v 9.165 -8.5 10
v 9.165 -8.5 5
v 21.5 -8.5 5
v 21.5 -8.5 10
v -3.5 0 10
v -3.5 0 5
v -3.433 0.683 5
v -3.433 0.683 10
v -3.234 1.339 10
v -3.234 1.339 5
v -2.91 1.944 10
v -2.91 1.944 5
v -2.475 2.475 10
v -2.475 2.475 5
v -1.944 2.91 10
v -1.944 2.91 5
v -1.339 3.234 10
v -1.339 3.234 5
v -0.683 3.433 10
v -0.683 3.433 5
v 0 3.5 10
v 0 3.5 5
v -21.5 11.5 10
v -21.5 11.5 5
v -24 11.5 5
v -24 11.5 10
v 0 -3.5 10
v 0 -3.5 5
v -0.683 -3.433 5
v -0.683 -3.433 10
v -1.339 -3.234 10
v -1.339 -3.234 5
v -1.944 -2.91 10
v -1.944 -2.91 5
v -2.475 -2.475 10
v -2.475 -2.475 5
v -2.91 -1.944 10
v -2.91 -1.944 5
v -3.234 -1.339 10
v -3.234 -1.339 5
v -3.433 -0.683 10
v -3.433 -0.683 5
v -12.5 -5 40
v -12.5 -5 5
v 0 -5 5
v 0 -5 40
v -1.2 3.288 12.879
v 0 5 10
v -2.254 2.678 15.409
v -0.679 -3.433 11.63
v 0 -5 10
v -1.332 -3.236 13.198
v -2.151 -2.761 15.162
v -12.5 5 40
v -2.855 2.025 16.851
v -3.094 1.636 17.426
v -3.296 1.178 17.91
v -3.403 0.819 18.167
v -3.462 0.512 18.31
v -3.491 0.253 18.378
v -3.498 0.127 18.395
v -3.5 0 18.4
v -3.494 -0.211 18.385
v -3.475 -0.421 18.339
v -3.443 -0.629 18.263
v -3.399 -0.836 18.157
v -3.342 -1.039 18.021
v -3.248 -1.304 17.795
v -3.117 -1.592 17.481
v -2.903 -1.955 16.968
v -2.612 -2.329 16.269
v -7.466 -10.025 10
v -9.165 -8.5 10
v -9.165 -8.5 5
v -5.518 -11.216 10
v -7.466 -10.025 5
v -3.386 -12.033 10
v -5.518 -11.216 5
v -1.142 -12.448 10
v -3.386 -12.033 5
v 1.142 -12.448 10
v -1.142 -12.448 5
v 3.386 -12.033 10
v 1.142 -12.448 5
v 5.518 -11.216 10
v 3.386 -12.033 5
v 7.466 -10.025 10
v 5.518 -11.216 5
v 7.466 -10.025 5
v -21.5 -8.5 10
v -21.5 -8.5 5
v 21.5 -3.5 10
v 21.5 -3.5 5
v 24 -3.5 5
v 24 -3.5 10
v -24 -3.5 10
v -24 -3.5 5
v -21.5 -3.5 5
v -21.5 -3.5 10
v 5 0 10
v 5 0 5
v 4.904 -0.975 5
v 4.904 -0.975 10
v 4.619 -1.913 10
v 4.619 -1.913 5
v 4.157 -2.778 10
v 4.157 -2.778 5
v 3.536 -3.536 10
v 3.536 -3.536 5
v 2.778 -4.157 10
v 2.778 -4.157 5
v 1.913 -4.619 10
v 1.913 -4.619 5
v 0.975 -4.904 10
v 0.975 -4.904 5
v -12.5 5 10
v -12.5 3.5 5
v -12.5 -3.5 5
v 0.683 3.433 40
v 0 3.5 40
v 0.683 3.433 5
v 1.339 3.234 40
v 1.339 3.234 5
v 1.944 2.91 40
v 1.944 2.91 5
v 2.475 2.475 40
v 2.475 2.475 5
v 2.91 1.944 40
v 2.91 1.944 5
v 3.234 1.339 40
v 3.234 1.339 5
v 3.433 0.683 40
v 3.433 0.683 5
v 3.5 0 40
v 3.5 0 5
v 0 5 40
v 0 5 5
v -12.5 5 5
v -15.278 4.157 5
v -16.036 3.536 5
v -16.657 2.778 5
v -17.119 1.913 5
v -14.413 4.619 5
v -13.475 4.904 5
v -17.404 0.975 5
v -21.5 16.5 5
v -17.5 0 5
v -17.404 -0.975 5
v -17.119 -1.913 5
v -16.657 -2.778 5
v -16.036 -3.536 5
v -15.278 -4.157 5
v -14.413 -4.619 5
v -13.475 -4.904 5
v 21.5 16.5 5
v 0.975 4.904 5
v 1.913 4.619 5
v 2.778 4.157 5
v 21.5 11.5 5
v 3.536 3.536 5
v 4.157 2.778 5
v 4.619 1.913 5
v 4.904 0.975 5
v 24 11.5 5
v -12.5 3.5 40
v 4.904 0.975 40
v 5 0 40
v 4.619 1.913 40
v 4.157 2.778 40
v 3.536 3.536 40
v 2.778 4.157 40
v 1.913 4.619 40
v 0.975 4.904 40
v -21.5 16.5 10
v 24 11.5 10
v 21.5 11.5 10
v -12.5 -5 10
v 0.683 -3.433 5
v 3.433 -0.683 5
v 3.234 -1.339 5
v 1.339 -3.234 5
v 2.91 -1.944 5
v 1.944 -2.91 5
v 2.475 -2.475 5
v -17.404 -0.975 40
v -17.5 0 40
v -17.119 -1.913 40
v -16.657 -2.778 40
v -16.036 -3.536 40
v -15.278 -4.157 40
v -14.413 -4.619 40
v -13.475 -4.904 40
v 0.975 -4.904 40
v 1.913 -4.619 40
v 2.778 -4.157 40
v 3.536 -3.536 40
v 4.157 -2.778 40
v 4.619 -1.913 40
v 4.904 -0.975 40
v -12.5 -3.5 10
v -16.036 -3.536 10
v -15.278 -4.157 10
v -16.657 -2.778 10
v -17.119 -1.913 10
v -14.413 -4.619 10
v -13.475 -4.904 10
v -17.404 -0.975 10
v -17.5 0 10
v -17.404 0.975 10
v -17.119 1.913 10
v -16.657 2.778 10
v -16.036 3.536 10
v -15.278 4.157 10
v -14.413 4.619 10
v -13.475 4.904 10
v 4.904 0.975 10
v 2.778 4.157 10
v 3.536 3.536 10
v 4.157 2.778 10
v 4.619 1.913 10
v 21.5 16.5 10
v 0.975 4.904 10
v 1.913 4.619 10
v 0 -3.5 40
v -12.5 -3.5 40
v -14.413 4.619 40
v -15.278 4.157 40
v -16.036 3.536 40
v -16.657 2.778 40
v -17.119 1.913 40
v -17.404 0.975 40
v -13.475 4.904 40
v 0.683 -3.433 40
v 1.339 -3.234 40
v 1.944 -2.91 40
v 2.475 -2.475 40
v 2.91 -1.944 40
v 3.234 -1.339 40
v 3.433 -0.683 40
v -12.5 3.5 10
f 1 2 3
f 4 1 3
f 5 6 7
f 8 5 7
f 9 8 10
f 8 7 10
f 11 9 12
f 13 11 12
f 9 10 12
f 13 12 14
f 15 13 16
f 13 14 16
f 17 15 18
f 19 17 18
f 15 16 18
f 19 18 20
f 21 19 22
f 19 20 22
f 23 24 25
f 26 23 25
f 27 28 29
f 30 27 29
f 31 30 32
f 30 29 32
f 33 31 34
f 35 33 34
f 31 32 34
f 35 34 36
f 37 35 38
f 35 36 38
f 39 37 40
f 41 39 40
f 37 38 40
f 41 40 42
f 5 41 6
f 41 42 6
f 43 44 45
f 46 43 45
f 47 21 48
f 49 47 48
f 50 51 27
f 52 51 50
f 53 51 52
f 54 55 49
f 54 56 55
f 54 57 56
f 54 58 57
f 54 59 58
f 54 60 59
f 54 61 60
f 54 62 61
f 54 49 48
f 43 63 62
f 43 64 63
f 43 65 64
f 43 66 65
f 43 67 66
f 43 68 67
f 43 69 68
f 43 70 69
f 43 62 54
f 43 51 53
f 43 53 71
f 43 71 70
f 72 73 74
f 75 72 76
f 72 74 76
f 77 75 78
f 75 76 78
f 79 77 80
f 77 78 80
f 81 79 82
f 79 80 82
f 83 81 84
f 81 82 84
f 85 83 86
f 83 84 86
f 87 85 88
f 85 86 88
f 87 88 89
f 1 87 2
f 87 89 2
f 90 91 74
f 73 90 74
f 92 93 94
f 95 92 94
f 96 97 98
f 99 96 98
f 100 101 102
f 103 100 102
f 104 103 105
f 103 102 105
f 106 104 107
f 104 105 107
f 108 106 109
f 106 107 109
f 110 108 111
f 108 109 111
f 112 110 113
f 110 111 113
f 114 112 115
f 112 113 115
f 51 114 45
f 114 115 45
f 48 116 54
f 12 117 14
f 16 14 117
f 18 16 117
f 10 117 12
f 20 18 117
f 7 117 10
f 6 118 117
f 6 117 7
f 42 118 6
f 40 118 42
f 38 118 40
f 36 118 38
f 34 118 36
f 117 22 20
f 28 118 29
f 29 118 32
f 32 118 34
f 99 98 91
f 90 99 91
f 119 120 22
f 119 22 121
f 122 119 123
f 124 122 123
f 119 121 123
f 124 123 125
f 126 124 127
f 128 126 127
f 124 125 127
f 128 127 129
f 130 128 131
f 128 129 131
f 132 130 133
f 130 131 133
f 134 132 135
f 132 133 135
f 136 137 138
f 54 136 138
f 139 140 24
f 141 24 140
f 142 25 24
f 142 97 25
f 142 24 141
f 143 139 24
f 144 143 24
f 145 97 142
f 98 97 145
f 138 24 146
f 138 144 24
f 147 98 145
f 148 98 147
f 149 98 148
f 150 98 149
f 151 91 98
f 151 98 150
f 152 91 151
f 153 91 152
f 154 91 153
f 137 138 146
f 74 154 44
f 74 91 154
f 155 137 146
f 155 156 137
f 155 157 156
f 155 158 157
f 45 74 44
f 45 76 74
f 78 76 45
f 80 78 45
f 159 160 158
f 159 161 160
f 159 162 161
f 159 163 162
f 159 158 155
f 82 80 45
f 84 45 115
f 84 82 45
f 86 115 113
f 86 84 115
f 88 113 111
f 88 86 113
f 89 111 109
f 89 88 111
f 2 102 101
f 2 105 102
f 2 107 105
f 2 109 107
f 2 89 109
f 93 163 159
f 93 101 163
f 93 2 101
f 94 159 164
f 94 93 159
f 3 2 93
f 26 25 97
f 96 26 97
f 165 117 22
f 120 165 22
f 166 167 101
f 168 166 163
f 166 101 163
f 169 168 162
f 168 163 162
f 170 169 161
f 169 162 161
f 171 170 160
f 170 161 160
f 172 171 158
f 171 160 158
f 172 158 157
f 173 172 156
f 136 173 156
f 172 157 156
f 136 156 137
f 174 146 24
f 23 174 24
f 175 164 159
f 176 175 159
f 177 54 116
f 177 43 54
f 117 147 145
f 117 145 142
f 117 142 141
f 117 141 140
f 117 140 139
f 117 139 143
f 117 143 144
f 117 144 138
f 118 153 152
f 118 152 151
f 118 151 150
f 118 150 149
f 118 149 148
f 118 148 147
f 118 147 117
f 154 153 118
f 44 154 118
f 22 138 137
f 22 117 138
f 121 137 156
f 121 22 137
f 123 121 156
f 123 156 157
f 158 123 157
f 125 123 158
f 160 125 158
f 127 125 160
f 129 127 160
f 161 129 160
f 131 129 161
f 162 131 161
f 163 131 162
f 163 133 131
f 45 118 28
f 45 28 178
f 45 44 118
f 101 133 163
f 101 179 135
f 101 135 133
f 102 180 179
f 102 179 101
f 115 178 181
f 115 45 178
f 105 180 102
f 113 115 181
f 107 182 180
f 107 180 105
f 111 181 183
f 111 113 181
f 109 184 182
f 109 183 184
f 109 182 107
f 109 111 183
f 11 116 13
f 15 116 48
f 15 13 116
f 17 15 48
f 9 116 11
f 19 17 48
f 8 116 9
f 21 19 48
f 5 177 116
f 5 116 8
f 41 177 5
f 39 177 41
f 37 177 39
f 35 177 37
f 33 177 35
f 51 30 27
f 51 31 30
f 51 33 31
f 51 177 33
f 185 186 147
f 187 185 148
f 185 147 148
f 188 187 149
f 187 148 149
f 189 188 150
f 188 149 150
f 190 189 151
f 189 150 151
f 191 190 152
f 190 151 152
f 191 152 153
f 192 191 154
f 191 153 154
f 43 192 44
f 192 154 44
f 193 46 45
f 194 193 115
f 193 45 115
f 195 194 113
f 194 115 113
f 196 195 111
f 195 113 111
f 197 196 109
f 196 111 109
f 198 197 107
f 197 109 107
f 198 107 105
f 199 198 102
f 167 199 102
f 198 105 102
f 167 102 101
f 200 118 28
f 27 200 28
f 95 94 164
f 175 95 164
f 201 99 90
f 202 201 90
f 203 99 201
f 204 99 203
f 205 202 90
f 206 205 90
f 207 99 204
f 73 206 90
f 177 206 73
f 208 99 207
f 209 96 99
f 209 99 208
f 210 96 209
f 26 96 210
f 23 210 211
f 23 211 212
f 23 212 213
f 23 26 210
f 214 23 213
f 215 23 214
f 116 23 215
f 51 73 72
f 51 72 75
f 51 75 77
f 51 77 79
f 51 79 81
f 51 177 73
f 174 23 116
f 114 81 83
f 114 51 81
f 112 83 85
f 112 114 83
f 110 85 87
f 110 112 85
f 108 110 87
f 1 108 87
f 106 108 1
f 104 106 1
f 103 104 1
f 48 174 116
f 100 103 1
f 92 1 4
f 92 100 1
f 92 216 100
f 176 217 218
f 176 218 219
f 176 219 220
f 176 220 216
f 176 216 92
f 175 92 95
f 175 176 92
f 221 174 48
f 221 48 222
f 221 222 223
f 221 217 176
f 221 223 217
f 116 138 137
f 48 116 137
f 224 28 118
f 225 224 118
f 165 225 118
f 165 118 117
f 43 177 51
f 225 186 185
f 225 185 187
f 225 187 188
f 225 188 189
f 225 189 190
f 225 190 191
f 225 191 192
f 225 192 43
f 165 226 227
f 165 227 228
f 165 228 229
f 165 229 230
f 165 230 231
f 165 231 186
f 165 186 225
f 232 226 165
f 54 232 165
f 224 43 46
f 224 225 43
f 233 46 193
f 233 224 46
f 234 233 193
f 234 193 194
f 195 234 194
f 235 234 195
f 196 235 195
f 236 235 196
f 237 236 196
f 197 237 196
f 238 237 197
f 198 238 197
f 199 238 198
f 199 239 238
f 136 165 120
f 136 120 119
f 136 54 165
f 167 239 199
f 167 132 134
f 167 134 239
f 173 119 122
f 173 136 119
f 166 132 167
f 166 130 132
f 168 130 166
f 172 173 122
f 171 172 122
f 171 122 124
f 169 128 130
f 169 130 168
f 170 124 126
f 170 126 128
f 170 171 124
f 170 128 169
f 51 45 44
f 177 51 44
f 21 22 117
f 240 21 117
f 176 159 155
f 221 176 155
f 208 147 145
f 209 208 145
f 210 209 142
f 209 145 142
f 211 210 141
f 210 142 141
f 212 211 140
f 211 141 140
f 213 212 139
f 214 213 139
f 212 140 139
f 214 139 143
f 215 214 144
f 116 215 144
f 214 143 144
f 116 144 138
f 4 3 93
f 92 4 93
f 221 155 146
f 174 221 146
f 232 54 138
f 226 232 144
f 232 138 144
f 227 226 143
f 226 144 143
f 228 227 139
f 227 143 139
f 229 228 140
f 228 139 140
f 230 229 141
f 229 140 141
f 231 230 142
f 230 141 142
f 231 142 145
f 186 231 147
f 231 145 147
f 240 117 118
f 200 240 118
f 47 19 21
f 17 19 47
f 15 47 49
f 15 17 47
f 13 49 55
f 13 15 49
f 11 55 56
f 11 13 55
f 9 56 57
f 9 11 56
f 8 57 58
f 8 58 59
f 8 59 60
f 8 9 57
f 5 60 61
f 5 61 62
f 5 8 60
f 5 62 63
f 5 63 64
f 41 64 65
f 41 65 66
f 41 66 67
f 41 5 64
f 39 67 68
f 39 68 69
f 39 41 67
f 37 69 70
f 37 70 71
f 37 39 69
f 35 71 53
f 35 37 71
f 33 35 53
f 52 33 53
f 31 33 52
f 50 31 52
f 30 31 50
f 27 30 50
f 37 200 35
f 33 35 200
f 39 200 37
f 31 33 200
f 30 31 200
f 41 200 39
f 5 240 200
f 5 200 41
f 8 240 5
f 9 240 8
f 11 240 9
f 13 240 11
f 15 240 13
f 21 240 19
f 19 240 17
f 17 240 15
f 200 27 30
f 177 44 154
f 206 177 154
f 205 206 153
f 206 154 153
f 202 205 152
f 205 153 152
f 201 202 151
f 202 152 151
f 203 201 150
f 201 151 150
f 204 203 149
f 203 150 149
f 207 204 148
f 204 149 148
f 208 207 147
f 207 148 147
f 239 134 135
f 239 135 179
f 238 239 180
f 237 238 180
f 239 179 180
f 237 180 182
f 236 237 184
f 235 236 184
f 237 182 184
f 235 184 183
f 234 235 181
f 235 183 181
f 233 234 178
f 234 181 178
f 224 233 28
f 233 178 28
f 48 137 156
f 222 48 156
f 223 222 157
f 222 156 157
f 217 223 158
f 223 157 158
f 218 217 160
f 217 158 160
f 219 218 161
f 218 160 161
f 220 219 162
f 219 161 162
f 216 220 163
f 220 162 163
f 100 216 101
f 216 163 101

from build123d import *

# Parameters (mm, degrees)
F2_DEPTH = 5
F3_DEPTH = 40
F4_DEPTH = 10
F5_DEPTH = 40
F7_DEPTH = 20


with BuildPart() as f2:
    # F1 (on Front) → F2 (new body, symmetric)
    with BuildSketch(Plane.XZ):
        Polygon((-12.5, 10), (0, 10), (-12.5, 40), align=None)
    extrude(amount=F2_DEPTH, both=True)

    # F0 (on Top) → F5 (cut)
    with BuildSketch(Plane.XY):
        with BuildLine():
            Line((0, 0), (0, 3.5))
            ThreePointArc((0, 3.5), (-2.4748737342, 2.4748737342), (-3.5, 0))
            Line((-3.5, 0), (0, 0))
        make_face()
        with BuildLine():
            ThreePointArc((-3.5, 0), (-2.4748737342, -2.4748737342), (0, -3.5))
            Line((0, -3.5), (0, 0))
            Line((0, 0), (-3.5, 0))
        make_face()
    extrude(amount=F5_DEPTH, mode=Mode.SUBTRACT)


with BuildPart() as f3:
    # F0 (on Top) → F3 (new body)
    with BuildSketch(Plane.XY):
        with BuildLine():
            Line((3.5, 0), (5, 0))
            ThreePointArc((5, 0), (3.5355339059, 3.5355339059), (0, 5))
            Line((0, 5), (0, 3.5))
            ThreePointArc((0, 3.5), (2.4748737342, 2.4748737342), (3.5, 0))
        make_face()
        with BuildLine():
            ThreePointArc((0, -5), (3.5355339059, -3.5355339059), (5, 0))
            Line((5, 0), (3.5, 0))
            ThreePointArc((3.5, 0), (2.4748737342, -2.4748737342), (0, -3.5))
            Line((0, -3.5), (0, -5))
        make_face()
        with BuildLine():
            Line((-11.4564392374, -5), (0, -5))
            ThreePointArc((0, -5), (-1.9364916731, -4.6097722286), (-3.5707142143, -3.5))
            Line((-3.5707142143, -3.5), (-8.9292857857, -3.5))
            ThreePointArc((-8.9292857857, -3.5), (-10.1099910027, -4.3917942794), (-11.5, -4.8989794856))
            ThreePointArc((-11.5, -4.8989794856), (-11.4783307541, -4.9495376652), (-11.4564392374, -5))
        make_face()
        with BuildLine():
            ThreePointArc((-3.5707142143, 3.5), (-1.9364916731, 4.6097722286), (0, 5))
            Line((0, 5), (-11.4564392374, 5))
            ThreePointArc((-11.4564392374, 5), (-11.4783307541, 4.9495376652), (-11.5, 4.8989794856))
            ThreePointArc((-11.5, 4.8989794856), (-10.1099910027, 4.3917942794), (-8.9292857857, 3.5))
            Line((-8.9292857857, 3.5), (-3.5707142143, 3.5))
        make_face()
        with BuildLine():
            Line((0, 3.5), (0, 5))
            ThreePointArc((0, 5), (-1.9364916731, 4.6097722286), (-3.5707142143, 3.5))
            Line((-3.5707142143, 3.5), (0, 3.5))
        make_face()
        with BuildLine():
            ThreePointArc((-3.5707142143, -3.5), (-1.9364916731, -4.6097722286), (0, -5))
            Line((0, -5), (0, -3.5))
            Line((0, -3.5), (-3.5707142143, -3.5))
        make_face()
        with BuildLine():
            Line((-12.5, 3.5), (-12.5, 5))
            ThreePointArc((-12.5, 5), (-16.0355339059, 3.5355339059), (-17.5, 0))
            Line((-17.5, 0), (-15.5, 0))
            ThreePointArc((-15.5, 0), (-14.6213203436, 2.1213203436), (-12.5, 3))
            Line((-12.5, 3), (-12.5, 3.5))
        make_face()
        with BuildLine():
            ThreePointArc((-17.5, 0), (-16.0355339059, -3.5355339059), (-12.5, -5))
            Line((-12.5, -5), (-12.5, -3.5))
            Line((-12.5, -3.5), (-12.5, -3))
            ThreePointArc((-12.5, -3), (-14.6213203436, -2.1213203436), (-15.5, 0))
            Line((-15.5, 0), (-17.5, 0))
        make_face()
        with BuildLine():
            Line((-12.5, 0), (-15.5, 0))
            ThreePointArc((-15.5, 0), (-14.6213203436, -2.1213203436), (-12.5, -3))
            Line((-12.5, -3), (-12.5, 0))
        make_face()
        with BuildLine():
            ThreePointArc((-12.5, 3), (-14.6213203436, 2.1213203436), (-15.5, 0))
            Line((-15.5, 0), (-12.5, 0))
            Line((-12.5, 0), (-12.5, 3))
        make_face()
        with BuildLine():
            ThreePointArc((-12, 3.5), (-11.7708022624, 4.2069245417), (-11.5, 4.8989794856))
            ThreePointArc((-11.5, 4.8989794856), (-11.99745519, 4.974680765), (-12.5, 5))
            Line((-12.5, 5), (-12.5, 3.5))
            Line((-12.5, 3.5), (-12, 3.5))
        make_face()
        with BuildLine():
            ThreePointArc((-12.5, -5), (-11.99745519, -4.974680765), (-11.5, -4.8989794856))
            ThreePointArc((-11.5, -4.8989794856), (-11.7708022624, -4.2069245417), (-12, -3.5))
            Line((-12, -3.5), (-12.5, -3.5))
            Line((-12.5, -3.5), (-12.5, -5))
        make_face()
        with BuildLine():
            ThreePointArc((-8.9292857857, 3.5), (-10.1099910027, 4.3917942794), (-11.5, 4.8989794856))
            ThreePointArc((-11.5, 4.8989794856), (-11.7708022624, 4.2069245417), (-12, 3.5))
            Line((-12, 3.5), (-8.9292857857, 3.5))
        make_face()
        with BuildLine():
            ThreePointArc((-11.5, -4.8989794856), (-10.1099910027, -4.3917942794), (-8.9292857857, -3.5))
            Line((-8.9292857857, -3.5), (-12, -3.5))
            ThreePointArc((-12, -3.5), (-11.7708022624, -4.2069245417), (-11.5, -4.8989794856))
        make_face()
        with BuildLine():
            ThreePointArc((-11.5, 4.8989794856), (-11.4783307541, 4.9495376652), (-11.4564392374, 5))
            Line((-11.4564392374, 5), (-12.5, 5))
            ThreePointArc((-12.5, 5), (-11.99745519, 4.974680765), (-11.5, 4.8989794856))
        make_face()
        with BuildLine():
            Line((-12.5, -5), (-11.4564392374, -5))
            ThreePointArc((-11.4564392374, -5), (-11.4783307541, -4.9495376652), (-11.5, -4.8989794856))
            ThreePointArc((-11.5, -4.8989794856), (-11.99745519, -4.974680765), (-12.5, -5))
        make_face()
    extrude(amount=F3_DEPTH)


with BuildPart() as f4:
    # F0 (on Top) → F4 (new body)
    with BuildSketch(Plane.XY):
        with BuildLine():
            ThreePointArc((-11.4564392374, 5), (-6.8465319688, 10.4582503317), (0, 12.5))
            Line((0, 12.5), (0, 16.5))
            Line((0, 16.5), (-21.5, 16.5))
            Line((-21.5, 16.5), (-21.5, 11.5))
            Line((-21.5, 11.5), (-24, 11.5))
            Line((-24, 11.5), (-24, 0))
            Line((-24, 0), (-17.5, 0))
            ThreePointArc((-17.5, 0), (-16.0355339059, 3.5355339059), (-12.5, 5))
            Line((-12.5, 5), (-11.4564392374, 5))
        make_face()
        with BuildLine():
            Line((-21.5, -8.5), (-9.1651513899, -8.5))
            ThreePointArc((-9.1651513899, -8.5), (-10.4582503317, -6.8465319688), (-11.4564392374, -5))
            Line((-11.4564392374, -5), (-12.5, -5))
            ThreePointArc((-12.5, -5), (-16.0355339059, -3.5355339059), (-17.5, 0))
            Line((-17.5, 0), (-24, 0))
            Line((-24, 0), (-24, -3.5))
            Line((-24, -3.5), (-21.5, -3.5))
            Line((-21.5, -3.5), (-21.5, -8.5))
        make_face()
        with BuildLine():
            Line((0, -8.5), (0, -5))
            Line((0, -5), (-11.4564392374, -5))
            ThreePointArc((-11.4564392374, -5), (-10.4582503317, -6.8465319688), (-9.1651513899, -8.5))
            Line((-9.1651513899, -8.5), (0, -8.5))
        make_face()
        with BuildLine():
            ThreePointArc((9.1651513899, -8.5), (10.4582503317, -6.8465319688), (11.4564392374, -5))
            Line((11.4564392374, -5), (0, -5))
            Line((0, -5), (0, -8.5))
            Line((0, -8.5), (9.1651513899, -8.5))
        make_face()
        with BuildLine():
            ThreePointArc((-9.1651513899, -8.5), (0, -12.5), (9.1651513899, -8.5))
            Line((9.1651513899, -8.5), (0, -8.5))
            Line((0, -8.5), (-9.1651513899, -8.5))
        make_face()
        with BuildLine():
            Line((24, 0), (12.5, 0))
            ThreePointArc((12.5, 0), (12.2363289116, -2.5538705461), (11.4564392374, -5))
            ThreePointArc((11.4564392374, -5), (10.4582503317, -6.8465319688), (9.1651513899, -8.5))
            Line((9.1651513899, -8.5), (21.5, -8.5))
            Line((21.5, -8.5), (21.5, -3.5))
            Line((21.5, -3.5), (24, -3.5))
            Line((24, -3.5), (24, 0))
        make_face()
        with BuildLine():
            ThreePointArc((11.4564392374, 5), (12.2363289116, 2.5538705461), (12.5, 0))
            Line((12.5, 0), (24, 0))
            Line((24, 0), (24, 11.5))
            Line((24, 11.5), (21.5, 11.5))
            Line((21.5, 11.5), (21.5, 16.5))
            Line((21.5, 16.5), (0, 16.5))
            Line((0, 16.5), (0, 12.5))
            ThreePointArc((0, 12.5), (6.8465319688, 10.4582503317), (11.4564392374, 5))
        make_face()
        with BuildLine():
            Line((0, 5), (11.4564392374, 5))
            ThreePointArc((11.4564392374, 5), (6.8465319688, 10.4582503317), (0, 12.5))
            Line((0, 12.5), (0, 5))
        make_face()
        with BuildLine():
            Line((0, 5), (0, 12.5))
            ThreePointArc((0, 12.5), (-6.8465319688, 10.4582503317), (-11.4564392374, 5))
            Line((-11.4564392374, 5), (0, 5))
        make_face()
        with BuildLine():
            Line((5, 0), (12.5, 0))
            ThreePointArc((12.5, 0), (12.2363289116, 2.5538705461), (11.4564392374, 5))
            Line((11.4564392374, 5), (0, 5))
            ThreePointArc((0, 5), (3.5355339059, 3.5355339059), (5, 0))
        make_face()
        with BuildLine():
            ThreePointArc((11.4564392374, -5), (12.2363289116, -2.5538705461), (12.5, 0))
            Line((12.5, 0), (5, 0))
            ThreePointArc((5, 0), (3.5355339059, -3.5355339059), (0, -5))
            Line((0, -5), (11.4564392374, -5))
        make_face()
    extrude(amount=F4_DEPTH)


with BuildPart() as f4b:
    # F0 (on Top) → F4, piece 2 (new body)
    with BuildSketch(Plane.XY):
        with BuildLine():
            Line((0, 3.5), (-3.5707142143, 3.5))
            ThreePointArc((-3.5707142143, 3.5), (-4.6289075964, 1.8902948088), (-5, 0))
            Line((-5, 0), (-3.5, 0))
            ThreePointArc((-3.5, 0), (-2.4748737342, 2.4748737342), (0, 3.5))
        make_face()
        with BuildLine():
            ThreePointArc((-5, 0), (-4.6289075964, 1.8902948088), (-3.5707142143, 3.5))
            Line((-3.5707142143, 3.5), (-8.9292857857, 3.5))
            ThreePointArc((-8.9292857857, 3.5), (-7.8710924036, 1.8902948088), (-7.5, 0))
            Line((-7.5, 0), (-5, 0))
        make_face()
        with BuildLine():
            Line((-8.9292857857, -3.5), (-3.5707142143, -3.5))
            ThreePointArc((-3.5707142143, -3.5), (-4.6289075964, -1.8902948088), (-5, 0))
            Line((-5, 0), (-7.5, 0))
            ThreePointArc((-7.5, 0), (-7.8710924036, -1.8902948088), (-8.9292857857, -3.5))
        make_face()
        with BuildLine():
            ThreePointArc((-5, 0), (-4.6289075964, -1.8902948088), (-3.5707142143, -3.5))
            Line((-3.5707142143, -3.5), (0, -3.5))
            ThreePointArc((0, -3.5), (-2.4748737342, -2.4748737342), (-3.5, 0))
            Line((-3.5, 0), (-5, 0))
        make_face()
        with BuildLine():
            Line((-12, -3.5), (-8.9292857857, -3.5))
            ThreePointArc((-8.9292857857, -3.5), (-7.8710924036, -1.8902948088), (-7.5, 0))
            Line((-7.5, 0), (-9.5, 0))
            ThreePointArc((-9.5, 0), (-10.2550055679, -1.9899748742), (-12.14, -2.978321675))
            ThreePointArc((-12.14, -2.978321675), (-12.072818108, -3.239917118), (-12, -3.5))
        make_face()
        with BuildLine():
            ThreePointArc((-7.5, 0), (-7.8710924036, 1.8902948088), (-8.9292857857, 3.5))
            Line((-8.9292857857, 3.5), (-12, 3.5))
            ThreePointArc((-12, 3.5), (-12.072818108, 3.239917118), (-12.14, 2.978321675))
            ThreePointArc((-12.14, 2.978321675), (-10.2550055679, 1.9899748742), (-9.5, 0))
            Line((-9.5, 0), (-7.5, 0))
        make_face()
        with BuildLine():
            ThreePointArc((-9.5, 0), (-10.2550055679, 1.9899748742), (-12.14, 2.978321675))
            ThreePointArc((-12.14, 2.978321675), (-12.409673646, 1.5), (-12.5, 0))
            Line((-12.5, 0), (-9.5, 0))
        make_face()
        with BuildLine():
            ThreePointArc((-12.14, -2.978321675), (-10.2550055679, -1.9899748742), (-9.5, 0))
            Line((-9.5, 0), (-12.5, 0))
            ThreePointArc((-12.5, 0), (-12.409673646, -1.5), (-12.14, -2.978321675))
        make_face()
        with BuildLine():
            ThreePointArc((-12.5, -3), (-12.3196739413, -2.9945755146), (-12.14, -2.978321675))
            ThreePointArc((-12.14, -2.978321675), (-12.409673646, -1.5), (-12.5, 0))
            Line((-12.5, 0), (-12.5, -3))
        make_face()
        with BuildLine():
            ThreePointArc((-12.5, 0), (-12.409673646, 1.5), (-12.14, 2.978321675))
            ThreePointArc((-12.14, 2.978321675), (-12.3196739413, 2.9945755146), (-12.5, 3))
            Line((-12.5, 3), (-12.5, 0))
        make_face()
        with BuildLine():
            ThreePointArc((-12.14, 2.978321675), (-12.072818108, 3.239917118), (-12, 3.5))
            Line((-12, 3.5), (-12.5, 3.5))
            Line((-12.5, 3.5), (-12.5, 3))
            ThreePointArc((-12.5, 3), (-12.3196739413, 2.9945755146), (-12.14, 2.978321675))
        make_face()
        with BuildLine():
            Line((-12.5, -3.5), (-12, -3.5))
            ThreePointArc((-12, -3.5), (-12.072818108, -3.239917118), (-12.14, -2.978321675))
            ThreePointArc((-12.14, -2.978321675), (-12.3196739413, -2.9945755146), (-12.5, -3))
            Line((-12.5, -3), (-12.5, -3.5))
        make_face()
    extrude(amount=F4_DEPTH)


with BuildPart() as f7_tool:
    # F6 (on Front) → F7 (new body, symmetric)
    with BuildSketch(Plane.XZ):
        Polygon((25, 45), (-25, 45), (-25, 5), (0, 5), (25, 5), align=None)
    extrude(amount=F7_DEPTH, both=True)


with BuildPart() as f2_1:
    add(f2.part)

    # F7: intersect by f7_tool
    add(f7_tool.part, mode=Mode.INTERSECT)


with BuildPart() as f3_1:
    add(f3.part)

    # F7: intersect by f7_tool
    add(f7_tool.part, mode=Mode.INTERSECT)


with BuildPart() as f4_1:
    add(f4.part)

    # F7: intersect by f7_tool
    add(f7_tool.part, mode=Mode.INTERSECT)


with BuildPart() as f4b_1:
    add(f4b.part)

    # F7: intersect by f7_tool
    add(f7_tool.part, mode=Mode.INTERSECT)


solid = Compound([f2_1.part, f3_1.part, f4_1.part, f4b_1.part])
